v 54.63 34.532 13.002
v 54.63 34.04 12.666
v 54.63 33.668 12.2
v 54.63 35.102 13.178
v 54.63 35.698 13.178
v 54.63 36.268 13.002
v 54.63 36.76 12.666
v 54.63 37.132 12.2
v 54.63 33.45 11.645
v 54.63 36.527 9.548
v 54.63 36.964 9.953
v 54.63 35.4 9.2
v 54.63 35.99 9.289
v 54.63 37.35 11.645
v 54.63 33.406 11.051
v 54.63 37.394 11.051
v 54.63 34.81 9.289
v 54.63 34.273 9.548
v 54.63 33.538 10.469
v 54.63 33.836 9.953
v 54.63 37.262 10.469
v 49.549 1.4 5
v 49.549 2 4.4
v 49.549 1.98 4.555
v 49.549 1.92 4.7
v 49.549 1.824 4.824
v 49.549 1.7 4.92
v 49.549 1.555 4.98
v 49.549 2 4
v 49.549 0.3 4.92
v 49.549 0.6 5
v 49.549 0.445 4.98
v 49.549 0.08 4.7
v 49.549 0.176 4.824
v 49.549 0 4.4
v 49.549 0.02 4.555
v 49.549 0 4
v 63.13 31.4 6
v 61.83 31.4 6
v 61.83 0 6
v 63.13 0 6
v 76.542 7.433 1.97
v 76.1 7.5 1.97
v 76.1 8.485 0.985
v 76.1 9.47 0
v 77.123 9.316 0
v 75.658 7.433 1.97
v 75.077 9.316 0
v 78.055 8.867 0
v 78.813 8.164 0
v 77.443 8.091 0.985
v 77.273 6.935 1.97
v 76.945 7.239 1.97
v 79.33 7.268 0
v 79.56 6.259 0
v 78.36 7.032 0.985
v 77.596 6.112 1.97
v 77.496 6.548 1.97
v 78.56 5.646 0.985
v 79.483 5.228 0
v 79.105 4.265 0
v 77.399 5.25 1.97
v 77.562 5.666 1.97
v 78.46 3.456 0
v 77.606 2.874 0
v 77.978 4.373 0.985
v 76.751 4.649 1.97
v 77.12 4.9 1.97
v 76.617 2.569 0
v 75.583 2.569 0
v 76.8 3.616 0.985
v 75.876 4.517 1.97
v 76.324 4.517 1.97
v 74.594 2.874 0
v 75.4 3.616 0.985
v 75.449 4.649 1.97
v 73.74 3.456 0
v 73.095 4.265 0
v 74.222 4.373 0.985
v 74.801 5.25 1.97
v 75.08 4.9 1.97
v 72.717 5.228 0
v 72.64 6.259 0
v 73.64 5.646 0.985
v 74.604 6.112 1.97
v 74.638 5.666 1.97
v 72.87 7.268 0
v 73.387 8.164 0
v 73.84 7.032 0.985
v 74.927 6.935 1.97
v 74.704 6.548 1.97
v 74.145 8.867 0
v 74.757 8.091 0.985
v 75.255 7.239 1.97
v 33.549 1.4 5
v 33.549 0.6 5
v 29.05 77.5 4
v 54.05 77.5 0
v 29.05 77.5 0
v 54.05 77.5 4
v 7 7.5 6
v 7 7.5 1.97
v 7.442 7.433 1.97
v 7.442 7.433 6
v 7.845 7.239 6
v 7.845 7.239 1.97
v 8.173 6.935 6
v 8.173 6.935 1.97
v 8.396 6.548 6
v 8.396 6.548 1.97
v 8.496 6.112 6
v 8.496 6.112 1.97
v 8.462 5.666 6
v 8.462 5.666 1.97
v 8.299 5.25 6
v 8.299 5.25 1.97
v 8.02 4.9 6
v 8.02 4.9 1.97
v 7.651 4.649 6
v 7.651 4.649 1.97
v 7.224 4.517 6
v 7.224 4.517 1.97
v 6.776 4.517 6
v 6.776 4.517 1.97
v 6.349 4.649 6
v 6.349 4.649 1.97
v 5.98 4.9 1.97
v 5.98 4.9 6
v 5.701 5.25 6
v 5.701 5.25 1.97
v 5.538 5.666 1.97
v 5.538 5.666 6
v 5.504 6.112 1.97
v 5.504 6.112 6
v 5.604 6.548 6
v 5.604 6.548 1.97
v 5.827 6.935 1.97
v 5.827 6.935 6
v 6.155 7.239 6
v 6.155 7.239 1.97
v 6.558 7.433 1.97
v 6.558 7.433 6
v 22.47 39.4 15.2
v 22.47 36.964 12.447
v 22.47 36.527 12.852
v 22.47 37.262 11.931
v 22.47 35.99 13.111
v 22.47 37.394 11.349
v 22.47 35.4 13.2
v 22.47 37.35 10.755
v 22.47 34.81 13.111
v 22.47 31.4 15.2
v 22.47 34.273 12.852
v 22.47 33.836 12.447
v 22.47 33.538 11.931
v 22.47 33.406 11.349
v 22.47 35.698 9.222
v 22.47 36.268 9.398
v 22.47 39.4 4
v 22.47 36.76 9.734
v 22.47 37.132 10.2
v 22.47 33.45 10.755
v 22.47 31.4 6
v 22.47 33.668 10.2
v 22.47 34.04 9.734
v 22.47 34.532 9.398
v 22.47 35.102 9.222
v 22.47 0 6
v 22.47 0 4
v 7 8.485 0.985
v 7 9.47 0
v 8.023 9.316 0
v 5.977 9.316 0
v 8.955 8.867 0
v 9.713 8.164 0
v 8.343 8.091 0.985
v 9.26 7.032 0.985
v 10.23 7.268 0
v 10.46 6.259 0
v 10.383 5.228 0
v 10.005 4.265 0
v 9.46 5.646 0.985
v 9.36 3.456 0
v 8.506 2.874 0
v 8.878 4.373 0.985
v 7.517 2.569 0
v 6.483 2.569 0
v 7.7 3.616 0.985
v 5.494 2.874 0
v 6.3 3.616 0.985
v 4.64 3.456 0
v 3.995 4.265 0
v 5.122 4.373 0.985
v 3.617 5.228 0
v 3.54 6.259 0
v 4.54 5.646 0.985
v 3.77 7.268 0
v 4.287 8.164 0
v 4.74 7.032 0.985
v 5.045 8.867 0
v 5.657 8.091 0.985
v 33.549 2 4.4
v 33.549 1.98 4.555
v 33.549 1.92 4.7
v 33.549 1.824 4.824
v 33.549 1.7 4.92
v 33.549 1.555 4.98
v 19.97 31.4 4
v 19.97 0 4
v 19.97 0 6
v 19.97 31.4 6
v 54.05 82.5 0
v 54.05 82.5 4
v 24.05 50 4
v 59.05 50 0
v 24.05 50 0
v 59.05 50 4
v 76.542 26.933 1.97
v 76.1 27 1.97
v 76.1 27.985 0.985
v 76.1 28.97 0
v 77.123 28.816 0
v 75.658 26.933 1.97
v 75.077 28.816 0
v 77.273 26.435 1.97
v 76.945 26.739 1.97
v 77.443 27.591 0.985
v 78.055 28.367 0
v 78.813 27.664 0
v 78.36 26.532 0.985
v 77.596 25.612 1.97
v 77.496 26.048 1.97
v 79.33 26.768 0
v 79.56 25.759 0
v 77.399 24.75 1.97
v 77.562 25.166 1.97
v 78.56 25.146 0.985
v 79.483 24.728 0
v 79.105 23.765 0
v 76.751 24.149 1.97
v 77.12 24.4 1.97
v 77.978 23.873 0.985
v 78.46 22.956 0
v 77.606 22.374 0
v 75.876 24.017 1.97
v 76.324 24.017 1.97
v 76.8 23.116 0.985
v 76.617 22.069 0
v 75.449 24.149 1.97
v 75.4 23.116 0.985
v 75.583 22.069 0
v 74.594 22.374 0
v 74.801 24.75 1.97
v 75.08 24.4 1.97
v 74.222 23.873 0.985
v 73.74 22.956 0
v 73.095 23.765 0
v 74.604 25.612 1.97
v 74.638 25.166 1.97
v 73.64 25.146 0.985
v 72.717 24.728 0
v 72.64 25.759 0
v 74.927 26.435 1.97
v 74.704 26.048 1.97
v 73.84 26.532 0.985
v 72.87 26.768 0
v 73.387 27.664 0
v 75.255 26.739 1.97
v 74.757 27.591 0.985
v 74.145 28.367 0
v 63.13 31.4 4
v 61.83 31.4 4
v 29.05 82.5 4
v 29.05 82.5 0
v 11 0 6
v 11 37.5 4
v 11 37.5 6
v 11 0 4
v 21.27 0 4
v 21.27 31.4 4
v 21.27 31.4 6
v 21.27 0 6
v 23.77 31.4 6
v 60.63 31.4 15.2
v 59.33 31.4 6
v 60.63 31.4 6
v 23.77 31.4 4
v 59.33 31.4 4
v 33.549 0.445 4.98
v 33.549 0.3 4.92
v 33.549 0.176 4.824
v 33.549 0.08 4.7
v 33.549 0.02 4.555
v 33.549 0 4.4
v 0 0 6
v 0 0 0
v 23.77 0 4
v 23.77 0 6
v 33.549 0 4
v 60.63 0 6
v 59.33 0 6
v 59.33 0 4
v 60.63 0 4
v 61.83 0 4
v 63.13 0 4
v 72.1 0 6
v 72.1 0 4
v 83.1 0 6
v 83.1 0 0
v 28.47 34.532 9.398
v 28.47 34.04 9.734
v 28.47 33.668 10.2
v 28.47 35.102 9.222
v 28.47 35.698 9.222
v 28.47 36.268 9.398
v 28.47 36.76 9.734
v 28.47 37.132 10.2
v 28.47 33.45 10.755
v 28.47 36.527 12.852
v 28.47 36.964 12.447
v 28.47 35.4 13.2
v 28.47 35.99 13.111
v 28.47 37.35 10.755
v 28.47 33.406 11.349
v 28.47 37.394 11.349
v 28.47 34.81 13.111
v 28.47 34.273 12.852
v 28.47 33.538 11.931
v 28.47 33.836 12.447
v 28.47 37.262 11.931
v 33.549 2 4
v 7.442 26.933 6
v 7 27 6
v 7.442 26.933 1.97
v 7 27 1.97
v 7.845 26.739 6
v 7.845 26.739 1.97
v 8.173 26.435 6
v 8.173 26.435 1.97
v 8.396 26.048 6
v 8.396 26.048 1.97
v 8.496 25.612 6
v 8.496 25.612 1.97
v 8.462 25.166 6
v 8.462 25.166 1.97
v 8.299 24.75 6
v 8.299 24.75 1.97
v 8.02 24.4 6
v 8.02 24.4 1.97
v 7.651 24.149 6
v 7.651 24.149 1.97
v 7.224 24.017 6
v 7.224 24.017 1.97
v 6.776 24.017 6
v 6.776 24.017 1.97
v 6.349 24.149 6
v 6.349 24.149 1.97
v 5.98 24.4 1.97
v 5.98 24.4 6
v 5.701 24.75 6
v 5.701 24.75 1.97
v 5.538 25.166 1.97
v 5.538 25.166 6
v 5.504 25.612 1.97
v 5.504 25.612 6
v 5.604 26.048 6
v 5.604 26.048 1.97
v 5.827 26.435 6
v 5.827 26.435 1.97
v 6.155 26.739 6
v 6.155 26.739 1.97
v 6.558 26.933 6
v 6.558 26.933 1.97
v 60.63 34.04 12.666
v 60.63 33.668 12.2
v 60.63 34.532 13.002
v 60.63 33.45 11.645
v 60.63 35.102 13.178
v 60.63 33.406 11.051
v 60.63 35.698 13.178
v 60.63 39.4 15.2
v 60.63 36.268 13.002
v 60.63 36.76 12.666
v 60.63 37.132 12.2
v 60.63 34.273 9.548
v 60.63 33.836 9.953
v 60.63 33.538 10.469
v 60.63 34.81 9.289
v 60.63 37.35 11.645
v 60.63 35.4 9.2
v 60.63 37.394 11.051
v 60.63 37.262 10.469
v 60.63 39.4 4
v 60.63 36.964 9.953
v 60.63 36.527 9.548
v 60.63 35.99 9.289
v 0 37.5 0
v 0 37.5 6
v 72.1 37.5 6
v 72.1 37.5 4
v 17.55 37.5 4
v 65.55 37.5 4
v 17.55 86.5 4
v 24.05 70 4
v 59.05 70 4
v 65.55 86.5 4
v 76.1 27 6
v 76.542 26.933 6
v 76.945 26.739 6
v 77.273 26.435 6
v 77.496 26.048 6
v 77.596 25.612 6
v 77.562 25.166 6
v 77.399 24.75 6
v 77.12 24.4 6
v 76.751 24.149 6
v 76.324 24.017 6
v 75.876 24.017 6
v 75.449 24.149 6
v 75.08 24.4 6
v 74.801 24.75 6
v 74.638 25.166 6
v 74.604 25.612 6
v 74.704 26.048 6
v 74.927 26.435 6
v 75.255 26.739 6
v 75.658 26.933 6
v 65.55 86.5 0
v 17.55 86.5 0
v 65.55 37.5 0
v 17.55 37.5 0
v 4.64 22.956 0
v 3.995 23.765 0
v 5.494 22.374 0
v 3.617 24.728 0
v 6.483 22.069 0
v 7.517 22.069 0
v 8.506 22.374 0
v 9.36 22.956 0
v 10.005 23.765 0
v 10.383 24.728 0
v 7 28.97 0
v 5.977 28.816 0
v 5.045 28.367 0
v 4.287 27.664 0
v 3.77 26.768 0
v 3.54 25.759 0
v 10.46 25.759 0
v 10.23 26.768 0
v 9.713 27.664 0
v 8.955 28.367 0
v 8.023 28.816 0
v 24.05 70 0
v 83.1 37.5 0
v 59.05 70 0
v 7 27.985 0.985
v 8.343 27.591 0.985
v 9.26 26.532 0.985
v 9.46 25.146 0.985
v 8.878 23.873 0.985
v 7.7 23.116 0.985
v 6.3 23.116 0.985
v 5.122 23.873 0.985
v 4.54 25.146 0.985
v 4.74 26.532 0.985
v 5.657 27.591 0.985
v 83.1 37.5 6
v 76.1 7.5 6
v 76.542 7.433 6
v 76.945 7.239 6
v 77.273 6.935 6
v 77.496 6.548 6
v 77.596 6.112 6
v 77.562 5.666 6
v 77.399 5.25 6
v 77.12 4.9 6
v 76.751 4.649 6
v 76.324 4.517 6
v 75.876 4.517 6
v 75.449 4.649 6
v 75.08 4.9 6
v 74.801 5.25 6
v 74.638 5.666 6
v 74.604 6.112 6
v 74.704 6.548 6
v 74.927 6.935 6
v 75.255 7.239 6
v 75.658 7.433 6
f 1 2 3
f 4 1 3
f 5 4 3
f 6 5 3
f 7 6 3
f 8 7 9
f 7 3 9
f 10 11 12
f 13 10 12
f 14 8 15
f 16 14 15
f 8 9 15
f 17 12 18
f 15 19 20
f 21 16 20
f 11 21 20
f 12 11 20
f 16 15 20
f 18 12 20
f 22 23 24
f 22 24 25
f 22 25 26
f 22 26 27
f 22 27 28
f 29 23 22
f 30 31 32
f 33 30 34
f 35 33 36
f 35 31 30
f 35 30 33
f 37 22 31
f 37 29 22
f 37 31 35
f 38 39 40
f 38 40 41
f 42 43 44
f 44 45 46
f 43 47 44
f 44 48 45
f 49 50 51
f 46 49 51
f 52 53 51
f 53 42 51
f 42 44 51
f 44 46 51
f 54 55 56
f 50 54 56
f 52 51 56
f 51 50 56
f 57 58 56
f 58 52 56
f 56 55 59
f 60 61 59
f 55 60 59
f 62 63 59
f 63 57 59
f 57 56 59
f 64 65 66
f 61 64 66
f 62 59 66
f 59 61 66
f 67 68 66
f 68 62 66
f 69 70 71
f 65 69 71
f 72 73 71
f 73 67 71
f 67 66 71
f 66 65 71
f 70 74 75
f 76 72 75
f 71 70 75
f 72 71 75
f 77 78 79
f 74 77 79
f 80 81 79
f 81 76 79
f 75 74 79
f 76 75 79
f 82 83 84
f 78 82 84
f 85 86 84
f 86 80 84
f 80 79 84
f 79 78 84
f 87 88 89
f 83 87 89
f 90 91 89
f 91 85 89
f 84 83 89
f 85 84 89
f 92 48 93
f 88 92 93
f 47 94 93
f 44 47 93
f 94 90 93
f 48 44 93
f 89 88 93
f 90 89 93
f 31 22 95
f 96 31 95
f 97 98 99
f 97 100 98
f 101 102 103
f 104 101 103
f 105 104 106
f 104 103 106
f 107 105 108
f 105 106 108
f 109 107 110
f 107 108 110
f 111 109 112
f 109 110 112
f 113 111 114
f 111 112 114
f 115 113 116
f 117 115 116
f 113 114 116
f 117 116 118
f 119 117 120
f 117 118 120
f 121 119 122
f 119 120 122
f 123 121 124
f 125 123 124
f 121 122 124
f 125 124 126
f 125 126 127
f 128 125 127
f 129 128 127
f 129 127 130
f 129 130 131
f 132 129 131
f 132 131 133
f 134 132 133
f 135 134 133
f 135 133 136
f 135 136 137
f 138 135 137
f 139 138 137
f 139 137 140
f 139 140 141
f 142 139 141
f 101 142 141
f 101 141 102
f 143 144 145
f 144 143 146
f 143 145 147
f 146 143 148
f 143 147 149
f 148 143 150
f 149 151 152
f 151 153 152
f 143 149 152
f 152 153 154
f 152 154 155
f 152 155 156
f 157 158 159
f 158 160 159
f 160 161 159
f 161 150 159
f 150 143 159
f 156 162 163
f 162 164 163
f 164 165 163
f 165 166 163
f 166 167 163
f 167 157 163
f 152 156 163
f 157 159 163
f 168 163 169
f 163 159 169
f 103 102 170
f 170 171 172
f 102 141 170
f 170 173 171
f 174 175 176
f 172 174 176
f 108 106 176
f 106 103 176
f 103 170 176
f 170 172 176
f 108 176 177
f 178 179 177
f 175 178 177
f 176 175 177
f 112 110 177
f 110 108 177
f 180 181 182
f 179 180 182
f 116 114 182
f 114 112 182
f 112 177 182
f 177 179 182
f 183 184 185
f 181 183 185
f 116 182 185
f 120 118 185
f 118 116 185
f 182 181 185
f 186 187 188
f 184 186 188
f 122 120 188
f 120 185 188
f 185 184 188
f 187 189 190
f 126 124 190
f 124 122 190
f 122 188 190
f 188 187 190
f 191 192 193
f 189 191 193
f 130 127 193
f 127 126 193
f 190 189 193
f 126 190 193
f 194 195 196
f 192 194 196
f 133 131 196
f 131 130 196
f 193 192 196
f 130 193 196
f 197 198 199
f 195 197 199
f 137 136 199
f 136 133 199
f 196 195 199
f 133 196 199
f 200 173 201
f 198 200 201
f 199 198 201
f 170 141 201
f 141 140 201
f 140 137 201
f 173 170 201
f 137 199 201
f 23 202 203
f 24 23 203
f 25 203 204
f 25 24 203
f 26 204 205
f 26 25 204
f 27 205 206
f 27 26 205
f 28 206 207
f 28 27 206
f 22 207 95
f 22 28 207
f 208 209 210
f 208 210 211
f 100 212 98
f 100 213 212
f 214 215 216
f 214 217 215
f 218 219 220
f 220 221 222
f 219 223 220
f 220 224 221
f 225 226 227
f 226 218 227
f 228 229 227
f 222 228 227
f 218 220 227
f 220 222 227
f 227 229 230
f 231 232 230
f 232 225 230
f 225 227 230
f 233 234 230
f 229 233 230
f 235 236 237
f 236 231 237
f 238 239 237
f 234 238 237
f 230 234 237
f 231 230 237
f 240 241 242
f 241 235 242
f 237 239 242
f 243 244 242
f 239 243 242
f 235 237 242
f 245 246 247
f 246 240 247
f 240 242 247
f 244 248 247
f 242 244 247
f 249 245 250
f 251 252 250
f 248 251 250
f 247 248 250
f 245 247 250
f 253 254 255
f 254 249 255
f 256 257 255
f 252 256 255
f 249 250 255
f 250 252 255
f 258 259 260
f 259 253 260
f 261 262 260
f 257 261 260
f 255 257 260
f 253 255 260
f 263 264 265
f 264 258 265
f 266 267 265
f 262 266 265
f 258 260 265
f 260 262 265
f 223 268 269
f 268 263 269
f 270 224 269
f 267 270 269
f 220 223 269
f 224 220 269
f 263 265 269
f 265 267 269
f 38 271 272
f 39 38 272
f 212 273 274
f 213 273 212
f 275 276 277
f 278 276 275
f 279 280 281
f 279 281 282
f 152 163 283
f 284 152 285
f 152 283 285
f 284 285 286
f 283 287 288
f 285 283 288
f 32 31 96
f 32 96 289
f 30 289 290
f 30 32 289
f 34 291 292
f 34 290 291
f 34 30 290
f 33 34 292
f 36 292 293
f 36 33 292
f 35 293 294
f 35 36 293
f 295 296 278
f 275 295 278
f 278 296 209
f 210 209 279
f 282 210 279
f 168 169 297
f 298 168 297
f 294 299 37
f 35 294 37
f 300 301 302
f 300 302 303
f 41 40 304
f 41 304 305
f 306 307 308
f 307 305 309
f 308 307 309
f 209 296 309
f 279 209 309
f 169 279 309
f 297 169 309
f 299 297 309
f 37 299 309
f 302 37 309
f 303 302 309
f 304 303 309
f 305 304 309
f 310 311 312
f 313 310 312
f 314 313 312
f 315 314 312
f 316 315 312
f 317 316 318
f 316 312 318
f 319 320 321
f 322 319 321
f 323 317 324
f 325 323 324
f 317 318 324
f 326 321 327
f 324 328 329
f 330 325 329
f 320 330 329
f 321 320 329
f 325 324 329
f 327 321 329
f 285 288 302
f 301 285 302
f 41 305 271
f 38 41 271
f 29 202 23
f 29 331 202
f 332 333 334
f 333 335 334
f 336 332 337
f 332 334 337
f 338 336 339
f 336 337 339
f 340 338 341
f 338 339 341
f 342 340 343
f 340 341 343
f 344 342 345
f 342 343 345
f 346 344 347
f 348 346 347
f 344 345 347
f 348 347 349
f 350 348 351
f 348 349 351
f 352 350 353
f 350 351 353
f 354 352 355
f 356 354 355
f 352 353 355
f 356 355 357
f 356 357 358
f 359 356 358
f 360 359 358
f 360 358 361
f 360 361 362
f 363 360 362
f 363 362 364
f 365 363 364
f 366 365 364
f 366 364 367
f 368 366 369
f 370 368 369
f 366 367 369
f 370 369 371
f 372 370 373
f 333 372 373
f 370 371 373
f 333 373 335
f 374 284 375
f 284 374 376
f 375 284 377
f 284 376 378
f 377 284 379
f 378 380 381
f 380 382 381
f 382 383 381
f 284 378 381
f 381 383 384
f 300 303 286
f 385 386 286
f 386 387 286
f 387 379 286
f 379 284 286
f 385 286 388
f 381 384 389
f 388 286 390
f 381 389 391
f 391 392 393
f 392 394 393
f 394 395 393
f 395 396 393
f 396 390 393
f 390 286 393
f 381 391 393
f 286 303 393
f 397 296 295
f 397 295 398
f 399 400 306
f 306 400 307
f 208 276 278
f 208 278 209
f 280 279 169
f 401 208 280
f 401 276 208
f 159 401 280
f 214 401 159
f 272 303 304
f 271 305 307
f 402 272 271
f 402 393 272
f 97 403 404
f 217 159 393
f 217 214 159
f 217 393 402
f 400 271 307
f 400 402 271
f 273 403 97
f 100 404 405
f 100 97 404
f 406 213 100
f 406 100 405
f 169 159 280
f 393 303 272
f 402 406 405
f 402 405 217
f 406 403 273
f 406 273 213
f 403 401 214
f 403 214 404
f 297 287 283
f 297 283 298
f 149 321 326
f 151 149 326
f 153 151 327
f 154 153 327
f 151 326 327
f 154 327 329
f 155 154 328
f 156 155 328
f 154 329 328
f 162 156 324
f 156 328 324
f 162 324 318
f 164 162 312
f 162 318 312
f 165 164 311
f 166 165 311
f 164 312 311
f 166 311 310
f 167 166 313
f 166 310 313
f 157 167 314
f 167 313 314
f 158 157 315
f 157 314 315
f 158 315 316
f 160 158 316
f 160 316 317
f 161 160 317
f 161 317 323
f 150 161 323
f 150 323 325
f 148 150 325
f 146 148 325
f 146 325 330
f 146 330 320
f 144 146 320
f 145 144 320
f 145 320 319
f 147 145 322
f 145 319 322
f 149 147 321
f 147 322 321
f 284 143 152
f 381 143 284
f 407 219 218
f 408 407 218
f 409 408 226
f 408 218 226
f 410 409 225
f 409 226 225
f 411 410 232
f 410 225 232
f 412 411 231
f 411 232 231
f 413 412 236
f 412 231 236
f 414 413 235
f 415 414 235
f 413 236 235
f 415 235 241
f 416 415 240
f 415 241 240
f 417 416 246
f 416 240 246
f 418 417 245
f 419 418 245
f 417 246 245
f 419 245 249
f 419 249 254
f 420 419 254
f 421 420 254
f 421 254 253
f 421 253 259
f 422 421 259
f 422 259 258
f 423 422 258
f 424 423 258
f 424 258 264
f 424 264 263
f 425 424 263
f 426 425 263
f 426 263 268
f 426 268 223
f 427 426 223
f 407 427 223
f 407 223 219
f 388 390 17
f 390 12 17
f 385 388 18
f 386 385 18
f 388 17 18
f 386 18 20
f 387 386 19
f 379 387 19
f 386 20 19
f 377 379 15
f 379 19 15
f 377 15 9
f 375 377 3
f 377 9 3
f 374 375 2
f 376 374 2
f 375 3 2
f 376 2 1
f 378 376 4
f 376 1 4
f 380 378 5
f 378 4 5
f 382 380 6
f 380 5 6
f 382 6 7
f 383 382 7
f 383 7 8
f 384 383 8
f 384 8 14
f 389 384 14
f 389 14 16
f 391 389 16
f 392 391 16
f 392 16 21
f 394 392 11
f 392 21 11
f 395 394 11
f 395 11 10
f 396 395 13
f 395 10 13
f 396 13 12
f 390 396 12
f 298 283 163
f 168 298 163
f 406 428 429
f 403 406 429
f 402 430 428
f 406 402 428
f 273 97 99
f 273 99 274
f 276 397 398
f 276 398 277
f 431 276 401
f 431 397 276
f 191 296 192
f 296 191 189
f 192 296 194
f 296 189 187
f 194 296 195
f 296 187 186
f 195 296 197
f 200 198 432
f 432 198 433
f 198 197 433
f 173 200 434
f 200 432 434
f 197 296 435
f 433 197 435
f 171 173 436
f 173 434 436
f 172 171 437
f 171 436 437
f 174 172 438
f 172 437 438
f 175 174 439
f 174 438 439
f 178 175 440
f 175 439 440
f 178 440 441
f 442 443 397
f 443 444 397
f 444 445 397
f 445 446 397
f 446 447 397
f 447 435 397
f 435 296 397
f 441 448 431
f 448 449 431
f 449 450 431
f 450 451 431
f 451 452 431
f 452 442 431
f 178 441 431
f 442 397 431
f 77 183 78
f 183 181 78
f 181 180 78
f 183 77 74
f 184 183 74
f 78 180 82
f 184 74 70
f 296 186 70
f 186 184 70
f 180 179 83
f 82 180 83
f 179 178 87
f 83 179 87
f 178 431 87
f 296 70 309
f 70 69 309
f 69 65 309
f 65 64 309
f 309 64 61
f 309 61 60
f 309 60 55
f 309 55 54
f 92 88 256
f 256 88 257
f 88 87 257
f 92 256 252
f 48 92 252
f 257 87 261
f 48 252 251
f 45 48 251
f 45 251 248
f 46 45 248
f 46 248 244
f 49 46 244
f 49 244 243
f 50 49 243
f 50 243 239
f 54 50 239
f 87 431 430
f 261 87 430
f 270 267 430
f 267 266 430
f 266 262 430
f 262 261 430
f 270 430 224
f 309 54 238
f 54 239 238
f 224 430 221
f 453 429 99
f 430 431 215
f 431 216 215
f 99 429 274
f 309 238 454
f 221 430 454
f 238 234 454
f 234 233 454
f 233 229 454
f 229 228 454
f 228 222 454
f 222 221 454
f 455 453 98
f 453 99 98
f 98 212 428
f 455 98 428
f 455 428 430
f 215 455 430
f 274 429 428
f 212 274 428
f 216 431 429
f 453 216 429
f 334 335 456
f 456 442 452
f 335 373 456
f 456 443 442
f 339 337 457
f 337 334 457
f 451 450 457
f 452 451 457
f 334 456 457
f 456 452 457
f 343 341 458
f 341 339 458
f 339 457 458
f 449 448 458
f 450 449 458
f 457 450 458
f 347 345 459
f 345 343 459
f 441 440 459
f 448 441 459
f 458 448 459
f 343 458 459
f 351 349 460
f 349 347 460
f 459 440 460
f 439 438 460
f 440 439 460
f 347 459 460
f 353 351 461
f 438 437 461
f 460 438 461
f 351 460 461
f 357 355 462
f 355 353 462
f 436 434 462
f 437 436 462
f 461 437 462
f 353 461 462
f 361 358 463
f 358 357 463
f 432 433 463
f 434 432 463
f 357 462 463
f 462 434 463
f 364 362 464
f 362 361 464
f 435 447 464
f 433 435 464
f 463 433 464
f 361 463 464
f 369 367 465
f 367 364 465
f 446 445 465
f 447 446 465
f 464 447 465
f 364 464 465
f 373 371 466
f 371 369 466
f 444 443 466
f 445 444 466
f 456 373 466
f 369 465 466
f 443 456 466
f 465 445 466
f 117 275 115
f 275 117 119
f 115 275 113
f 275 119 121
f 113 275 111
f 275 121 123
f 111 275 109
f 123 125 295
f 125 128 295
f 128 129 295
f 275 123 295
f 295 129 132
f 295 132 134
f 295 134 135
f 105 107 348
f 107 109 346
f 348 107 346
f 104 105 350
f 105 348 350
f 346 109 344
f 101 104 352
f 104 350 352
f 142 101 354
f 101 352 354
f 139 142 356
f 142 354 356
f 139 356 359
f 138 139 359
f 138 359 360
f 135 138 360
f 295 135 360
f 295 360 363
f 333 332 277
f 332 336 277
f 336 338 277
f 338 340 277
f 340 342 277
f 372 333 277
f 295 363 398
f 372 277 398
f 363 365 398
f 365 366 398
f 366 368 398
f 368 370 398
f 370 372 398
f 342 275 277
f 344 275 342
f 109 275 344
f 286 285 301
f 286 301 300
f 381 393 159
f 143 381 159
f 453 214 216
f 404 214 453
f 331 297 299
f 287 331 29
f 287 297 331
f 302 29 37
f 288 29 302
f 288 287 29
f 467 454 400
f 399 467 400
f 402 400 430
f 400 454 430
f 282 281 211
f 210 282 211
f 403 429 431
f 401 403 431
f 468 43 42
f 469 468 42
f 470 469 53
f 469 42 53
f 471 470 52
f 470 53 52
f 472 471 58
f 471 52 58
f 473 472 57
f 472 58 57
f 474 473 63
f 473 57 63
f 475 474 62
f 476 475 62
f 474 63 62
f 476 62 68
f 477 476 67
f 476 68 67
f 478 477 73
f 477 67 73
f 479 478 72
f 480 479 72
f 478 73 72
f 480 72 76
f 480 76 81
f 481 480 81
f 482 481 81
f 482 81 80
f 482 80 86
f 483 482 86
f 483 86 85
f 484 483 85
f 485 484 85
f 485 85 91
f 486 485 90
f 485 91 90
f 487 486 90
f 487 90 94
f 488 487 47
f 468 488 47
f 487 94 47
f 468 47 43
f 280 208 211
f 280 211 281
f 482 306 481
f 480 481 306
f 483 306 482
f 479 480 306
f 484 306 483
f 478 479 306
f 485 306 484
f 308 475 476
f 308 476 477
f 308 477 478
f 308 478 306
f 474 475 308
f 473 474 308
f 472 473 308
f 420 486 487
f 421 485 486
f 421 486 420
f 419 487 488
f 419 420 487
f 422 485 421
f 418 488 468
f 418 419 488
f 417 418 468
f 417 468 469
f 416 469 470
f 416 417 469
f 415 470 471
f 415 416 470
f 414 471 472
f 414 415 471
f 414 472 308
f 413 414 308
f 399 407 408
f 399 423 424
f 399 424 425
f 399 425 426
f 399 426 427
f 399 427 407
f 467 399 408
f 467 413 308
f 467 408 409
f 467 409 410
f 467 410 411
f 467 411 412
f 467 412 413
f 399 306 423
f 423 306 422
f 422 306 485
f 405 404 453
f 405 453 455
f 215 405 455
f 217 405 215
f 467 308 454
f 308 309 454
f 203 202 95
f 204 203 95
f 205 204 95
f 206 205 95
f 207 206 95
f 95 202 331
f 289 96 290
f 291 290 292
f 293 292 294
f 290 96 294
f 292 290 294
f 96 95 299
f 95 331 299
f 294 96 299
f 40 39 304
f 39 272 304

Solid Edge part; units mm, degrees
sketch "Sketch1" plane through (0, 0, 0) normal (0, 0, 1) x (1, 0, 0)
  line L0 (83.1, 37.5) -> (65.55, 37.5)
  line L1 (65.55, 37.5) -> (65.55, 86.5)
  line L2 (65.55, 86.5) -> (17.55, 86.5)
  line L3 (17.55, 86.5) -> (17.55, 37.5)
  line L4 (0, 37.5) -> (17.55, 37.5)
  line L5 (0, 0) -> (0, 37.5)
  line L6 (0, 0) -> (83.1, 0)
  line L7 (83.1, 0) -> (83.1, 37.5)
extrude "Protrusion1" add sketch "Sketch1" along normal blind 4
sketch "Sketch2" plane through (40.5, 43.25, 4) normal (0, 0, 1) x (1, 0, 0)
  line L0 (-29.5, -5.75) -> (-29.5, -43.25)
  line L1 (-29.5, -43.25) -> (-40.5, -43.25)
  line L2 (-40.5, -43.25) -> (-40.5, -5.75)
  line L3 (-40.5, -5.75) -> (-29.5, -5.75)
  line L4 (-20.53, -43.25) -> (-20.53, -11.85)
  line L5 (-20.53, -11.85) -> (-19.23, -11.85)
  line L6 (-19.23, -11.85) -> (-19.23, -43.25)
  line L7 (-19.23, -43.25) -> (-20.53, -43.25)
  line L8 (-16.73, -11.85) -> (-16.73, -43.25)
  line L9 (-16.73, -43.25) -> (-18.03, -43.25)
  line L10 (-18.03, -43.25) -> (-18.03, -11.85)
  line L11 (-18.03, -11.85) -> (-16.73, -11.85)
  line L12 (18.83, -11.85) -> (18.83, -43.25)
  line L13 (18.83, -43.25) -> (20.13, -43.25)
  line L14 (20.13, -43.25) -> (20.13, -11.85)
  line L15 (20.13, -11.85) -> (18.83, -11.85)
  line L16 (22.63, -43.25) -> (22.63, -11.85)
  line L17 (22.63, -11.85) -> (21.33, -11.85)
  line L18 (21.33, -11.85) -> (21.33, -43.25)
  line L19 (21.33, -43.25) -> (22.63, -43.25)
  line L20 (31.6, -5.75) -> (31.6, -43.25)
  line L21 (31.6, -43.25) -> (42.6, -43.25)
  line L22 (42.6, -43.25) -> (42.6, -5.75)
  line L23 (42.6, -5.75) -> (31.6, -5.75)
  dimension "D1" = 37.5
  dimension "D2" = 6.55
  dimension "D3" = 6.55
  dimension "D4" = 37.5
  dimension "D5" = 11
  dimension "D6" = 11
  dimension "D7" = 2.42
  dimension "D8" = 31.4
  dimension "D9" = 1.3
  dimension "D10" = 31.4
  dimension "D11" = 1.3
  dimension "D12" = 4.92
  dimension "D13" = 31.4
  dimension "D14" = 1.3
  dimension "D15" = 2.42
  dimension "D16" = 31.4
  dimension "D17" = 1.3
  dimension "D18" = 4.92
extrude "ExtrudedProtrusion_2" add sketch "Sketch2" along normal blind 2
sketch "Sketch3" plane through (41.55, 43.25, 4) normal (0, 0, 1) x (1, 0, 0)
  line L0 (-19.08, -11.85) -> (19.08, -11.85)
  line L1 (19.08, -11.85) -> (19.08, -3.85)
  line L2 (19.08, -3.85) -> (-19.08, -3.85)
  line L3 (-19.08, -3.85) -> (-19.08, -11.85)
extrude "ExtrudedProtrusion_3" add sketch "Sketch3" along normal blind 11.2
hole "Hole_1" at (60.63, 35.4, 11.2) direction (-1, 0, 0) diameter 4 depth 6
hole "Hole_2" at (22.47, 35.4, 11.2) direction (1, 0, 0) diameter 4 depth 6
sketch "Sketch4" plane through (41.55, 43.25, 4) normal (0, 0, 1) x (1, 0, 0)
  line L0 (12.5, 34.25) -> (-12.5, 34.25)
  line L1 (-12.5, 34.25) -> (-12.5, 39.25)
  line L2 (-12.5, 39.25) -> (12.5, 39.25)
  line L3 (12.5, 39.25) -> (12.5, 34.25)
  line L4 (-17.5, 26.75) -> (17.5, 26.75)
  line L5 (17.5, 26.75) -> (17.5, 6.75)
  line L6 (17.5, 6.75) -> (-17.5, 6.75)
  line L7 (-17.5, 6.75) -> (-17.5, 26.75)
  dimension "D1" = 35
  dimension "D2" = 20
  dimension "D3" = 12.5
  dimension "D4" = 6.5
  dimension "D5" = 25
  dimension "D6" = 5
  dimension "D7" = 4
  dimension "D8" = 11.5
extrude "Cutout1" cut sketch "Sketch4" against normal through all
hole "Hole_3" at (7, 6, 0) direction (0, 0, 1) diameter 3 end through all countersink diameter 6.94 countersink angle 90
hole "Hole1" at (7, 25.5, 0) direction (0, 0, 1) diameter 3 end through all countersink diameter 6.94 countersink angle 90
hole "Hole2" at (76.1, 6, 0) direction (0, 0, 1) diameter 3 end through all countersink diameter 6.94 countersink angle 90
hole "Hole3" at (76.1, 25.5, 0) direction (0, 0, 1) diameter 3 end through all countersink diameter 6.94 countersink angle 90
sketch "Sketch5" plane through (41.55, 15.7, 4) normal (0, 0, 1) x (1, 0, 0)
  line L0 (-8.0007, -13.7) -> (7.9993, -13.7)
  line L1 (7.9993, -13.7) -> (7.9993, -15.7)
  line L2 (-8.0007, -15.7) -> (7.9993, -15.7)
  line L3 (-8.0007, -13.7) -> (-8.0007, -15.7)
extrude "ExtrudedProtrusion_4" add sketch "Sketch5" along normal blind 1
fillet "Round_1" radius 0.6 2 edges at (41.5493, 2, 5) (41.5493, 0, 5)
